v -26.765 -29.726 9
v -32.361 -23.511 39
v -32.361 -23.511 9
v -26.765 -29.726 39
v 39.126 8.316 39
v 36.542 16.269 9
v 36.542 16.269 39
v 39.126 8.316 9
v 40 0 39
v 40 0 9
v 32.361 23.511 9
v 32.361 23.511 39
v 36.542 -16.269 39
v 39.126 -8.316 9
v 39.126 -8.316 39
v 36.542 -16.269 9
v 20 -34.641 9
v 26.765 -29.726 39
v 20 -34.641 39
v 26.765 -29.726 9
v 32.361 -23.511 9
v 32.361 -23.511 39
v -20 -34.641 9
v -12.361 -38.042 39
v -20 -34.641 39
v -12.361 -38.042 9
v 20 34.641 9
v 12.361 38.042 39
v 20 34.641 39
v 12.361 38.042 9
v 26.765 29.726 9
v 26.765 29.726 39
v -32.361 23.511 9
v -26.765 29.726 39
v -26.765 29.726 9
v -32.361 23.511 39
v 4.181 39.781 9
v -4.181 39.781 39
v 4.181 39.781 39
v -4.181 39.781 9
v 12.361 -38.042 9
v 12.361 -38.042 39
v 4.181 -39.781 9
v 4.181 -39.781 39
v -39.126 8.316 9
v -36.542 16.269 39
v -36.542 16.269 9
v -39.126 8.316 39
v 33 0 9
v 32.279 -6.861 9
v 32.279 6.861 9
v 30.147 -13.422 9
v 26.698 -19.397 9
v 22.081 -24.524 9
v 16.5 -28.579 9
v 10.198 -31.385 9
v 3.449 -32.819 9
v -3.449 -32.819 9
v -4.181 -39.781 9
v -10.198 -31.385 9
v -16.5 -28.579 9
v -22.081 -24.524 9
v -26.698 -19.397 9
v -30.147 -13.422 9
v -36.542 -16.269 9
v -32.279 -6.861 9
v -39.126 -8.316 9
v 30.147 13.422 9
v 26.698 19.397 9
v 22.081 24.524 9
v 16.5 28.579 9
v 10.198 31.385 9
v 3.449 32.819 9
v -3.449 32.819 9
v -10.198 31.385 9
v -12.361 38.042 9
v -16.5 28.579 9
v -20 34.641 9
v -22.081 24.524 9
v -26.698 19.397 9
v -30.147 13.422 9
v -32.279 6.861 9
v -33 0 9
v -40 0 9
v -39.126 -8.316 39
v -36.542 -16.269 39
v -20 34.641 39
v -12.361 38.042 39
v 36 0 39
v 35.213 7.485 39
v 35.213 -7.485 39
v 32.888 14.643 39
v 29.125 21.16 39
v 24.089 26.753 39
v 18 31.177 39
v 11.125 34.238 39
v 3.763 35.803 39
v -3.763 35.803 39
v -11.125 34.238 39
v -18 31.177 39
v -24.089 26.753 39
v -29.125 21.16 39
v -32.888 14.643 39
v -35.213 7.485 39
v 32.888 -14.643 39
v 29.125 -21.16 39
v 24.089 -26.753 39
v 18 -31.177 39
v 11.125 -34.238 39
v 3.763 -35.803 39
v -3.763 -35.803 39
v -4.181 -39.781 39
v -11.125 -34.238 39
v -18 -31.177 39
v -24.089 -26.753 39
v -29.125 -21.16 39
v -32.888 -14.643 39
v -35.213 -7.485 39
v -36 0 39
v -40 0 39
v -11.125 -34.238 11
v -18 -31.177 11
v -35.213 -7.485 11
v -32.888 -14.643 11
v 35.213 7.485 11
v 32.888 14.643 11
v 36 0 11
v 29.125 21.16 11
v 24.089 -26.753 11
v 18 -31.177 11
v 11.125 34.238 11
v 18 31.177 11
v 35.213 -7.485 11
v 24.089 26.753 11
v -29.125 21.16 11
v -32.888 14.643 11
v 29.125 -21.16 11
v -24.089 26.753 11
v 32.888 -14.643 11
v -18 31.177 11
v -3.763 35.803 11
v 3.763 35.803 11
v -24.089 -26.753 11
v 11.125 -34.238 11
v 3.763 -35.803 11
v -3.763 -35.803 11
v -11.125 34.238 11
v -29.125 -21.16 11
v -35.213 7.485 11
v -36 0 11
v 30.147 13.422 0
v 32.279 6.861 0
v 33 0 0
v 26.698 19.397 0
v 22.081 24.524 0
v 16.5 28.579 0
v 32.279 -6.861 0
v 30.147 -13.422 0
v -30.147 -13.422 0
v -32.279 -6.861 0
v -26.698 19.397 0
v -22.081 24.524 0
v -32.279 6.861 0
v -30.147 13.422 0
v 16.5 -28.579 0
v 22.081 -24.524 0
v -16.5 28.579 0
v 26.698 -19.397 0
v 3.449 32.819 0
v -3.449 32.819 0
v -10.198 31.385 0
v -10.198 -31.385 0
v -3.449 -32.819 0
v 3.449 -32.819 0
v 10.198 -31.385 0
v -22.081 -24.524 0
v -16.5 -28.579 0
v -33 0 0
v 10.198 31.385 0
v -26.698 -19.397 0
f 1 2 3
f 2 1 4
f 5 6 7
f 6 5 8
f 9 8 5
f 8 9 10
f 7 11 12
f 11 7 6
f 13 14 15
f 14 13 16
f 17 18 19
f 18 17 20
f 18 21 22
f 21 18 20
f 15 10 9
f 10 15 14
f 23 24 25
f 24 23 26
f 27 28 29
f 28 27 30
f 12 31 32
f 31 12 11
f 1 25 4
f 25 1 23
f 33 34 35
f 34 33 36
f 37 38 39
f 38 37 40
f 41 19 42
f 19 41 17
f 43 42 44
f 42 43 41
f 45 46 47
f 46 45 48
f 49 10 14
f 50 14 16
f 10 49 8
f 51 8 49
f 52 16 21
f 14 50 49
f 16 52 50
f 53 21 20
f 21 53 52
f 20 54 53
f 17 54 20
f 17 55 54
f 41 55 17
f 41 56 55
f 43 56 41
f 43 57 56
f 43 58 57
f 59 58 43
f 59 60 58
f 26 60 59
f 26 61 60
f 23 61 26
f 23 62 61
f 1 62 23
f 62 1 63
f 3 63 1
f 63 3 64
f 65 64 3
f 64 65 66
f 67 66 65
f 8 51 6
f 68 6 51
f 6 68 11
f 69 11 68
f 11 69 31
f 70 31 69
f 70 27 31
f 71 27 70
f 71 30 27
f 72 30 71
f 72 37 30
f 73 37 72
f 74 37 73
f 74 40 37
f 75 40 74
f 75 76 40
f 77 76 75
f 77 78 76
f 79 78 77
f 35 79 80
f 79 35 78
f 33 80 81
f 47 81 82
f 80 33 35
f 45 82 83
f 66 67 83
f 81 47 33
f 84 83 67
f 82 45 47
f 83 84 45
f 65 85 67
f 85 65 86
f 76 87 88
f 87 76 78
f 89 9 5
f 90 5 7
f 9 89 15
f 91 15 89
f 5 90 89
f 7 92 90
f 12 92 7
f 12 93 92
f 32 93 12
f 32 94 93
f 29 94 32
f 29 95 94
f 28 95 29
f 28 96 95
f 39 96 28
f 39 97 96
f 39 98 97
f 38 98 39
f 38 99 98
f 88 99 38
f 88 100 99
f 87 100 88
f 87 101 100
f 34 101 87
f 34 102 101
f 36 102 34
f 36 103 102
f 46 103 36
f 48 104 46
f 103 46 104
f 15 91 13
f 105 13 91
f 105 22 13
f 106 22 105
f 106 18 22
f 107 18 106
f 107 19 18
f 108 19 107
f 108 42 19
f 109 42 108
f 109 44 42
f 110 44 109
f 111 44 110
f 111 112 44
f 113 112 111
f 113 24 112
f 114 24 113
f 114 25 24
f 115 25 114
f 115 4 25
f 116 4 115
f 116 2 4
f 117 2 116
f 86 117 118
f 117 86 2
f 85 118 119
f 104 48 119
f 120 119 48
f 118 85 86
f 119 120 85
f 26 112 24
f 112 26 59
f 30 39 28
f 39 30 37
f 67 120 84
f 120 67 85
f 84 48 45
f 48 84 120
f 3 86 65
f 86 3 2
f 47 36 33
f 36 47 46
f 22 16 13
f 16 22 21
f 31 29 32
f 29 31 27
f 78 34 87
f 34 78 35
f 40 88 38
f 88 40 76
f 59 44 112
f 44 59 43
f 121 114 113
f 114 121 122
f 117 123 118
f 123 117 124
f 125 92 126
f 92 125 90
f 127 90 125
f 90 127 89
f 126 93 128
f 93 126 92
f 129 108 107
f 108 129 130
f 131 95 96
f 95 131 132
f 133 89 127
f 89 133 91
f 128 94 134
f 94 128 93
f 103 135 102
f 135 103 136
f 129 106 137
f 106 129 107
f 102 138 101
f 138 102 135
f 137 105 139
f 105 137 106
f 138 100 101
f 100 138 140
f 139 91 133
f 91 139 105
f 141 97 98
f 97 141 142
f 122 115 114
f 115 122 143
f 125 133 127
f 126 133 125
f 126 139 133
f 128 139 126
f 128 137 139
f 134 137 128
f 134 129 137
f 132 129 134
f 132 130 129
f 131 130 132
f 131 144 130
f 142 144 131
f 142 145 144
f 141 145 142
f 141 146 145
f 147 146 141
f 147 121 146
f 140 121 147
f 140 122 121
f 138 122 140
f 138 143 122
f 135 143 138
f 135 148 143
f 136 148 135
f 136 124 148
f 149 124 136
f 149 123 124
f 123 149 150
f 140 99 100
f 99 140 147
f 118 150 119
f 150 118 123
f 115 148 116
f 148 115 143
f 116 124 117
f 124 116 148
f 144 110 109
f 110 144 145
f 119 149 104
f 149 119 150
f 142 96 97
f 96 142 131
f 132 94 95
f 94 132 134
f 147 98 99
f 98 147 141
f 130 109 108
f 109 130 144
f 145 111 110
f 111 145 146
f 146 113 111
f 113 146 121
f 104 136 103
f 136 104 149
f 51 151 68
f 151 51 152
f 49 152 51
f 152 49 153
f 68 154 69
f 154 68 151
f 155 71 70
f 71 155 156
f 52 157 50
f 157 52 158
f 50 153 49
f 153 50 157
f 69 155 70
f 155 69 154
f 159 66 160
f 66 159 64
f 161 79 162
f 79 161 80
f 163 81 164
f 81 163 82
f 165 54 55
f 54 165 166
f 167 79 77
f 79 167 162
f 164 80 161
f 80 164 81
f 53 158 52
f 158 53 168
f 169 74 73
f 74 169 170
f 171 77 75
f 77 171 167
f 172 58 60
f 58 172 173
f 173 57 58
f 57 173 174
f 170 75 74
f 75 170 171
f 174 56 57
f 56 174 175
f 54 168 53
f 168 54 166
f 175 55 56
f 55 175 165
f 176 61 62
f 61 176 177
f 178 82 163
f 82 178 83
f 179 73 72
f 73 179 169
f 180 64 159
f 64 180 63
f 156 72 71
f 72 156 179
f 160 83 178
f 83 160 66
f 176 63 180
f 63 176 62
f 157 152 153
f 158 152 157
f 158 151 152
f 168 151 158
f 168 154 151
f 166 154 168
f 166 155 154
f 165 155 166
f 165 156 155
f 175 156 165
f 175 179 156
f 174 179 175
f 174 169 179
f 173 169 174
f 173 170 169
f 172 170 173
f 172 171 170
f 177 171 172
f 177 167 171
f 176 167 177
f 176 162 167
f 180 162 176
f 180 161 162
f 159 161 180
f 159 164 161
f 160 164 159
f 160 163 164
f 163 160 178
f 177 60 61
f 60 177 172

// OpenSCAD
h_klein=10;
h_gross=30;
d_klein=66;
d_gross=80;
d_becher=72;



cylinder(h_klein,d=d_klein,true);

translate([0,0,h_klein-1])
 difference()
 {
  cylinder(h_gross,d=d_gross,true);
 translate([0,0,h_klein -8])
 cylinder(h_gross+5,d=d_becher,true);
}
